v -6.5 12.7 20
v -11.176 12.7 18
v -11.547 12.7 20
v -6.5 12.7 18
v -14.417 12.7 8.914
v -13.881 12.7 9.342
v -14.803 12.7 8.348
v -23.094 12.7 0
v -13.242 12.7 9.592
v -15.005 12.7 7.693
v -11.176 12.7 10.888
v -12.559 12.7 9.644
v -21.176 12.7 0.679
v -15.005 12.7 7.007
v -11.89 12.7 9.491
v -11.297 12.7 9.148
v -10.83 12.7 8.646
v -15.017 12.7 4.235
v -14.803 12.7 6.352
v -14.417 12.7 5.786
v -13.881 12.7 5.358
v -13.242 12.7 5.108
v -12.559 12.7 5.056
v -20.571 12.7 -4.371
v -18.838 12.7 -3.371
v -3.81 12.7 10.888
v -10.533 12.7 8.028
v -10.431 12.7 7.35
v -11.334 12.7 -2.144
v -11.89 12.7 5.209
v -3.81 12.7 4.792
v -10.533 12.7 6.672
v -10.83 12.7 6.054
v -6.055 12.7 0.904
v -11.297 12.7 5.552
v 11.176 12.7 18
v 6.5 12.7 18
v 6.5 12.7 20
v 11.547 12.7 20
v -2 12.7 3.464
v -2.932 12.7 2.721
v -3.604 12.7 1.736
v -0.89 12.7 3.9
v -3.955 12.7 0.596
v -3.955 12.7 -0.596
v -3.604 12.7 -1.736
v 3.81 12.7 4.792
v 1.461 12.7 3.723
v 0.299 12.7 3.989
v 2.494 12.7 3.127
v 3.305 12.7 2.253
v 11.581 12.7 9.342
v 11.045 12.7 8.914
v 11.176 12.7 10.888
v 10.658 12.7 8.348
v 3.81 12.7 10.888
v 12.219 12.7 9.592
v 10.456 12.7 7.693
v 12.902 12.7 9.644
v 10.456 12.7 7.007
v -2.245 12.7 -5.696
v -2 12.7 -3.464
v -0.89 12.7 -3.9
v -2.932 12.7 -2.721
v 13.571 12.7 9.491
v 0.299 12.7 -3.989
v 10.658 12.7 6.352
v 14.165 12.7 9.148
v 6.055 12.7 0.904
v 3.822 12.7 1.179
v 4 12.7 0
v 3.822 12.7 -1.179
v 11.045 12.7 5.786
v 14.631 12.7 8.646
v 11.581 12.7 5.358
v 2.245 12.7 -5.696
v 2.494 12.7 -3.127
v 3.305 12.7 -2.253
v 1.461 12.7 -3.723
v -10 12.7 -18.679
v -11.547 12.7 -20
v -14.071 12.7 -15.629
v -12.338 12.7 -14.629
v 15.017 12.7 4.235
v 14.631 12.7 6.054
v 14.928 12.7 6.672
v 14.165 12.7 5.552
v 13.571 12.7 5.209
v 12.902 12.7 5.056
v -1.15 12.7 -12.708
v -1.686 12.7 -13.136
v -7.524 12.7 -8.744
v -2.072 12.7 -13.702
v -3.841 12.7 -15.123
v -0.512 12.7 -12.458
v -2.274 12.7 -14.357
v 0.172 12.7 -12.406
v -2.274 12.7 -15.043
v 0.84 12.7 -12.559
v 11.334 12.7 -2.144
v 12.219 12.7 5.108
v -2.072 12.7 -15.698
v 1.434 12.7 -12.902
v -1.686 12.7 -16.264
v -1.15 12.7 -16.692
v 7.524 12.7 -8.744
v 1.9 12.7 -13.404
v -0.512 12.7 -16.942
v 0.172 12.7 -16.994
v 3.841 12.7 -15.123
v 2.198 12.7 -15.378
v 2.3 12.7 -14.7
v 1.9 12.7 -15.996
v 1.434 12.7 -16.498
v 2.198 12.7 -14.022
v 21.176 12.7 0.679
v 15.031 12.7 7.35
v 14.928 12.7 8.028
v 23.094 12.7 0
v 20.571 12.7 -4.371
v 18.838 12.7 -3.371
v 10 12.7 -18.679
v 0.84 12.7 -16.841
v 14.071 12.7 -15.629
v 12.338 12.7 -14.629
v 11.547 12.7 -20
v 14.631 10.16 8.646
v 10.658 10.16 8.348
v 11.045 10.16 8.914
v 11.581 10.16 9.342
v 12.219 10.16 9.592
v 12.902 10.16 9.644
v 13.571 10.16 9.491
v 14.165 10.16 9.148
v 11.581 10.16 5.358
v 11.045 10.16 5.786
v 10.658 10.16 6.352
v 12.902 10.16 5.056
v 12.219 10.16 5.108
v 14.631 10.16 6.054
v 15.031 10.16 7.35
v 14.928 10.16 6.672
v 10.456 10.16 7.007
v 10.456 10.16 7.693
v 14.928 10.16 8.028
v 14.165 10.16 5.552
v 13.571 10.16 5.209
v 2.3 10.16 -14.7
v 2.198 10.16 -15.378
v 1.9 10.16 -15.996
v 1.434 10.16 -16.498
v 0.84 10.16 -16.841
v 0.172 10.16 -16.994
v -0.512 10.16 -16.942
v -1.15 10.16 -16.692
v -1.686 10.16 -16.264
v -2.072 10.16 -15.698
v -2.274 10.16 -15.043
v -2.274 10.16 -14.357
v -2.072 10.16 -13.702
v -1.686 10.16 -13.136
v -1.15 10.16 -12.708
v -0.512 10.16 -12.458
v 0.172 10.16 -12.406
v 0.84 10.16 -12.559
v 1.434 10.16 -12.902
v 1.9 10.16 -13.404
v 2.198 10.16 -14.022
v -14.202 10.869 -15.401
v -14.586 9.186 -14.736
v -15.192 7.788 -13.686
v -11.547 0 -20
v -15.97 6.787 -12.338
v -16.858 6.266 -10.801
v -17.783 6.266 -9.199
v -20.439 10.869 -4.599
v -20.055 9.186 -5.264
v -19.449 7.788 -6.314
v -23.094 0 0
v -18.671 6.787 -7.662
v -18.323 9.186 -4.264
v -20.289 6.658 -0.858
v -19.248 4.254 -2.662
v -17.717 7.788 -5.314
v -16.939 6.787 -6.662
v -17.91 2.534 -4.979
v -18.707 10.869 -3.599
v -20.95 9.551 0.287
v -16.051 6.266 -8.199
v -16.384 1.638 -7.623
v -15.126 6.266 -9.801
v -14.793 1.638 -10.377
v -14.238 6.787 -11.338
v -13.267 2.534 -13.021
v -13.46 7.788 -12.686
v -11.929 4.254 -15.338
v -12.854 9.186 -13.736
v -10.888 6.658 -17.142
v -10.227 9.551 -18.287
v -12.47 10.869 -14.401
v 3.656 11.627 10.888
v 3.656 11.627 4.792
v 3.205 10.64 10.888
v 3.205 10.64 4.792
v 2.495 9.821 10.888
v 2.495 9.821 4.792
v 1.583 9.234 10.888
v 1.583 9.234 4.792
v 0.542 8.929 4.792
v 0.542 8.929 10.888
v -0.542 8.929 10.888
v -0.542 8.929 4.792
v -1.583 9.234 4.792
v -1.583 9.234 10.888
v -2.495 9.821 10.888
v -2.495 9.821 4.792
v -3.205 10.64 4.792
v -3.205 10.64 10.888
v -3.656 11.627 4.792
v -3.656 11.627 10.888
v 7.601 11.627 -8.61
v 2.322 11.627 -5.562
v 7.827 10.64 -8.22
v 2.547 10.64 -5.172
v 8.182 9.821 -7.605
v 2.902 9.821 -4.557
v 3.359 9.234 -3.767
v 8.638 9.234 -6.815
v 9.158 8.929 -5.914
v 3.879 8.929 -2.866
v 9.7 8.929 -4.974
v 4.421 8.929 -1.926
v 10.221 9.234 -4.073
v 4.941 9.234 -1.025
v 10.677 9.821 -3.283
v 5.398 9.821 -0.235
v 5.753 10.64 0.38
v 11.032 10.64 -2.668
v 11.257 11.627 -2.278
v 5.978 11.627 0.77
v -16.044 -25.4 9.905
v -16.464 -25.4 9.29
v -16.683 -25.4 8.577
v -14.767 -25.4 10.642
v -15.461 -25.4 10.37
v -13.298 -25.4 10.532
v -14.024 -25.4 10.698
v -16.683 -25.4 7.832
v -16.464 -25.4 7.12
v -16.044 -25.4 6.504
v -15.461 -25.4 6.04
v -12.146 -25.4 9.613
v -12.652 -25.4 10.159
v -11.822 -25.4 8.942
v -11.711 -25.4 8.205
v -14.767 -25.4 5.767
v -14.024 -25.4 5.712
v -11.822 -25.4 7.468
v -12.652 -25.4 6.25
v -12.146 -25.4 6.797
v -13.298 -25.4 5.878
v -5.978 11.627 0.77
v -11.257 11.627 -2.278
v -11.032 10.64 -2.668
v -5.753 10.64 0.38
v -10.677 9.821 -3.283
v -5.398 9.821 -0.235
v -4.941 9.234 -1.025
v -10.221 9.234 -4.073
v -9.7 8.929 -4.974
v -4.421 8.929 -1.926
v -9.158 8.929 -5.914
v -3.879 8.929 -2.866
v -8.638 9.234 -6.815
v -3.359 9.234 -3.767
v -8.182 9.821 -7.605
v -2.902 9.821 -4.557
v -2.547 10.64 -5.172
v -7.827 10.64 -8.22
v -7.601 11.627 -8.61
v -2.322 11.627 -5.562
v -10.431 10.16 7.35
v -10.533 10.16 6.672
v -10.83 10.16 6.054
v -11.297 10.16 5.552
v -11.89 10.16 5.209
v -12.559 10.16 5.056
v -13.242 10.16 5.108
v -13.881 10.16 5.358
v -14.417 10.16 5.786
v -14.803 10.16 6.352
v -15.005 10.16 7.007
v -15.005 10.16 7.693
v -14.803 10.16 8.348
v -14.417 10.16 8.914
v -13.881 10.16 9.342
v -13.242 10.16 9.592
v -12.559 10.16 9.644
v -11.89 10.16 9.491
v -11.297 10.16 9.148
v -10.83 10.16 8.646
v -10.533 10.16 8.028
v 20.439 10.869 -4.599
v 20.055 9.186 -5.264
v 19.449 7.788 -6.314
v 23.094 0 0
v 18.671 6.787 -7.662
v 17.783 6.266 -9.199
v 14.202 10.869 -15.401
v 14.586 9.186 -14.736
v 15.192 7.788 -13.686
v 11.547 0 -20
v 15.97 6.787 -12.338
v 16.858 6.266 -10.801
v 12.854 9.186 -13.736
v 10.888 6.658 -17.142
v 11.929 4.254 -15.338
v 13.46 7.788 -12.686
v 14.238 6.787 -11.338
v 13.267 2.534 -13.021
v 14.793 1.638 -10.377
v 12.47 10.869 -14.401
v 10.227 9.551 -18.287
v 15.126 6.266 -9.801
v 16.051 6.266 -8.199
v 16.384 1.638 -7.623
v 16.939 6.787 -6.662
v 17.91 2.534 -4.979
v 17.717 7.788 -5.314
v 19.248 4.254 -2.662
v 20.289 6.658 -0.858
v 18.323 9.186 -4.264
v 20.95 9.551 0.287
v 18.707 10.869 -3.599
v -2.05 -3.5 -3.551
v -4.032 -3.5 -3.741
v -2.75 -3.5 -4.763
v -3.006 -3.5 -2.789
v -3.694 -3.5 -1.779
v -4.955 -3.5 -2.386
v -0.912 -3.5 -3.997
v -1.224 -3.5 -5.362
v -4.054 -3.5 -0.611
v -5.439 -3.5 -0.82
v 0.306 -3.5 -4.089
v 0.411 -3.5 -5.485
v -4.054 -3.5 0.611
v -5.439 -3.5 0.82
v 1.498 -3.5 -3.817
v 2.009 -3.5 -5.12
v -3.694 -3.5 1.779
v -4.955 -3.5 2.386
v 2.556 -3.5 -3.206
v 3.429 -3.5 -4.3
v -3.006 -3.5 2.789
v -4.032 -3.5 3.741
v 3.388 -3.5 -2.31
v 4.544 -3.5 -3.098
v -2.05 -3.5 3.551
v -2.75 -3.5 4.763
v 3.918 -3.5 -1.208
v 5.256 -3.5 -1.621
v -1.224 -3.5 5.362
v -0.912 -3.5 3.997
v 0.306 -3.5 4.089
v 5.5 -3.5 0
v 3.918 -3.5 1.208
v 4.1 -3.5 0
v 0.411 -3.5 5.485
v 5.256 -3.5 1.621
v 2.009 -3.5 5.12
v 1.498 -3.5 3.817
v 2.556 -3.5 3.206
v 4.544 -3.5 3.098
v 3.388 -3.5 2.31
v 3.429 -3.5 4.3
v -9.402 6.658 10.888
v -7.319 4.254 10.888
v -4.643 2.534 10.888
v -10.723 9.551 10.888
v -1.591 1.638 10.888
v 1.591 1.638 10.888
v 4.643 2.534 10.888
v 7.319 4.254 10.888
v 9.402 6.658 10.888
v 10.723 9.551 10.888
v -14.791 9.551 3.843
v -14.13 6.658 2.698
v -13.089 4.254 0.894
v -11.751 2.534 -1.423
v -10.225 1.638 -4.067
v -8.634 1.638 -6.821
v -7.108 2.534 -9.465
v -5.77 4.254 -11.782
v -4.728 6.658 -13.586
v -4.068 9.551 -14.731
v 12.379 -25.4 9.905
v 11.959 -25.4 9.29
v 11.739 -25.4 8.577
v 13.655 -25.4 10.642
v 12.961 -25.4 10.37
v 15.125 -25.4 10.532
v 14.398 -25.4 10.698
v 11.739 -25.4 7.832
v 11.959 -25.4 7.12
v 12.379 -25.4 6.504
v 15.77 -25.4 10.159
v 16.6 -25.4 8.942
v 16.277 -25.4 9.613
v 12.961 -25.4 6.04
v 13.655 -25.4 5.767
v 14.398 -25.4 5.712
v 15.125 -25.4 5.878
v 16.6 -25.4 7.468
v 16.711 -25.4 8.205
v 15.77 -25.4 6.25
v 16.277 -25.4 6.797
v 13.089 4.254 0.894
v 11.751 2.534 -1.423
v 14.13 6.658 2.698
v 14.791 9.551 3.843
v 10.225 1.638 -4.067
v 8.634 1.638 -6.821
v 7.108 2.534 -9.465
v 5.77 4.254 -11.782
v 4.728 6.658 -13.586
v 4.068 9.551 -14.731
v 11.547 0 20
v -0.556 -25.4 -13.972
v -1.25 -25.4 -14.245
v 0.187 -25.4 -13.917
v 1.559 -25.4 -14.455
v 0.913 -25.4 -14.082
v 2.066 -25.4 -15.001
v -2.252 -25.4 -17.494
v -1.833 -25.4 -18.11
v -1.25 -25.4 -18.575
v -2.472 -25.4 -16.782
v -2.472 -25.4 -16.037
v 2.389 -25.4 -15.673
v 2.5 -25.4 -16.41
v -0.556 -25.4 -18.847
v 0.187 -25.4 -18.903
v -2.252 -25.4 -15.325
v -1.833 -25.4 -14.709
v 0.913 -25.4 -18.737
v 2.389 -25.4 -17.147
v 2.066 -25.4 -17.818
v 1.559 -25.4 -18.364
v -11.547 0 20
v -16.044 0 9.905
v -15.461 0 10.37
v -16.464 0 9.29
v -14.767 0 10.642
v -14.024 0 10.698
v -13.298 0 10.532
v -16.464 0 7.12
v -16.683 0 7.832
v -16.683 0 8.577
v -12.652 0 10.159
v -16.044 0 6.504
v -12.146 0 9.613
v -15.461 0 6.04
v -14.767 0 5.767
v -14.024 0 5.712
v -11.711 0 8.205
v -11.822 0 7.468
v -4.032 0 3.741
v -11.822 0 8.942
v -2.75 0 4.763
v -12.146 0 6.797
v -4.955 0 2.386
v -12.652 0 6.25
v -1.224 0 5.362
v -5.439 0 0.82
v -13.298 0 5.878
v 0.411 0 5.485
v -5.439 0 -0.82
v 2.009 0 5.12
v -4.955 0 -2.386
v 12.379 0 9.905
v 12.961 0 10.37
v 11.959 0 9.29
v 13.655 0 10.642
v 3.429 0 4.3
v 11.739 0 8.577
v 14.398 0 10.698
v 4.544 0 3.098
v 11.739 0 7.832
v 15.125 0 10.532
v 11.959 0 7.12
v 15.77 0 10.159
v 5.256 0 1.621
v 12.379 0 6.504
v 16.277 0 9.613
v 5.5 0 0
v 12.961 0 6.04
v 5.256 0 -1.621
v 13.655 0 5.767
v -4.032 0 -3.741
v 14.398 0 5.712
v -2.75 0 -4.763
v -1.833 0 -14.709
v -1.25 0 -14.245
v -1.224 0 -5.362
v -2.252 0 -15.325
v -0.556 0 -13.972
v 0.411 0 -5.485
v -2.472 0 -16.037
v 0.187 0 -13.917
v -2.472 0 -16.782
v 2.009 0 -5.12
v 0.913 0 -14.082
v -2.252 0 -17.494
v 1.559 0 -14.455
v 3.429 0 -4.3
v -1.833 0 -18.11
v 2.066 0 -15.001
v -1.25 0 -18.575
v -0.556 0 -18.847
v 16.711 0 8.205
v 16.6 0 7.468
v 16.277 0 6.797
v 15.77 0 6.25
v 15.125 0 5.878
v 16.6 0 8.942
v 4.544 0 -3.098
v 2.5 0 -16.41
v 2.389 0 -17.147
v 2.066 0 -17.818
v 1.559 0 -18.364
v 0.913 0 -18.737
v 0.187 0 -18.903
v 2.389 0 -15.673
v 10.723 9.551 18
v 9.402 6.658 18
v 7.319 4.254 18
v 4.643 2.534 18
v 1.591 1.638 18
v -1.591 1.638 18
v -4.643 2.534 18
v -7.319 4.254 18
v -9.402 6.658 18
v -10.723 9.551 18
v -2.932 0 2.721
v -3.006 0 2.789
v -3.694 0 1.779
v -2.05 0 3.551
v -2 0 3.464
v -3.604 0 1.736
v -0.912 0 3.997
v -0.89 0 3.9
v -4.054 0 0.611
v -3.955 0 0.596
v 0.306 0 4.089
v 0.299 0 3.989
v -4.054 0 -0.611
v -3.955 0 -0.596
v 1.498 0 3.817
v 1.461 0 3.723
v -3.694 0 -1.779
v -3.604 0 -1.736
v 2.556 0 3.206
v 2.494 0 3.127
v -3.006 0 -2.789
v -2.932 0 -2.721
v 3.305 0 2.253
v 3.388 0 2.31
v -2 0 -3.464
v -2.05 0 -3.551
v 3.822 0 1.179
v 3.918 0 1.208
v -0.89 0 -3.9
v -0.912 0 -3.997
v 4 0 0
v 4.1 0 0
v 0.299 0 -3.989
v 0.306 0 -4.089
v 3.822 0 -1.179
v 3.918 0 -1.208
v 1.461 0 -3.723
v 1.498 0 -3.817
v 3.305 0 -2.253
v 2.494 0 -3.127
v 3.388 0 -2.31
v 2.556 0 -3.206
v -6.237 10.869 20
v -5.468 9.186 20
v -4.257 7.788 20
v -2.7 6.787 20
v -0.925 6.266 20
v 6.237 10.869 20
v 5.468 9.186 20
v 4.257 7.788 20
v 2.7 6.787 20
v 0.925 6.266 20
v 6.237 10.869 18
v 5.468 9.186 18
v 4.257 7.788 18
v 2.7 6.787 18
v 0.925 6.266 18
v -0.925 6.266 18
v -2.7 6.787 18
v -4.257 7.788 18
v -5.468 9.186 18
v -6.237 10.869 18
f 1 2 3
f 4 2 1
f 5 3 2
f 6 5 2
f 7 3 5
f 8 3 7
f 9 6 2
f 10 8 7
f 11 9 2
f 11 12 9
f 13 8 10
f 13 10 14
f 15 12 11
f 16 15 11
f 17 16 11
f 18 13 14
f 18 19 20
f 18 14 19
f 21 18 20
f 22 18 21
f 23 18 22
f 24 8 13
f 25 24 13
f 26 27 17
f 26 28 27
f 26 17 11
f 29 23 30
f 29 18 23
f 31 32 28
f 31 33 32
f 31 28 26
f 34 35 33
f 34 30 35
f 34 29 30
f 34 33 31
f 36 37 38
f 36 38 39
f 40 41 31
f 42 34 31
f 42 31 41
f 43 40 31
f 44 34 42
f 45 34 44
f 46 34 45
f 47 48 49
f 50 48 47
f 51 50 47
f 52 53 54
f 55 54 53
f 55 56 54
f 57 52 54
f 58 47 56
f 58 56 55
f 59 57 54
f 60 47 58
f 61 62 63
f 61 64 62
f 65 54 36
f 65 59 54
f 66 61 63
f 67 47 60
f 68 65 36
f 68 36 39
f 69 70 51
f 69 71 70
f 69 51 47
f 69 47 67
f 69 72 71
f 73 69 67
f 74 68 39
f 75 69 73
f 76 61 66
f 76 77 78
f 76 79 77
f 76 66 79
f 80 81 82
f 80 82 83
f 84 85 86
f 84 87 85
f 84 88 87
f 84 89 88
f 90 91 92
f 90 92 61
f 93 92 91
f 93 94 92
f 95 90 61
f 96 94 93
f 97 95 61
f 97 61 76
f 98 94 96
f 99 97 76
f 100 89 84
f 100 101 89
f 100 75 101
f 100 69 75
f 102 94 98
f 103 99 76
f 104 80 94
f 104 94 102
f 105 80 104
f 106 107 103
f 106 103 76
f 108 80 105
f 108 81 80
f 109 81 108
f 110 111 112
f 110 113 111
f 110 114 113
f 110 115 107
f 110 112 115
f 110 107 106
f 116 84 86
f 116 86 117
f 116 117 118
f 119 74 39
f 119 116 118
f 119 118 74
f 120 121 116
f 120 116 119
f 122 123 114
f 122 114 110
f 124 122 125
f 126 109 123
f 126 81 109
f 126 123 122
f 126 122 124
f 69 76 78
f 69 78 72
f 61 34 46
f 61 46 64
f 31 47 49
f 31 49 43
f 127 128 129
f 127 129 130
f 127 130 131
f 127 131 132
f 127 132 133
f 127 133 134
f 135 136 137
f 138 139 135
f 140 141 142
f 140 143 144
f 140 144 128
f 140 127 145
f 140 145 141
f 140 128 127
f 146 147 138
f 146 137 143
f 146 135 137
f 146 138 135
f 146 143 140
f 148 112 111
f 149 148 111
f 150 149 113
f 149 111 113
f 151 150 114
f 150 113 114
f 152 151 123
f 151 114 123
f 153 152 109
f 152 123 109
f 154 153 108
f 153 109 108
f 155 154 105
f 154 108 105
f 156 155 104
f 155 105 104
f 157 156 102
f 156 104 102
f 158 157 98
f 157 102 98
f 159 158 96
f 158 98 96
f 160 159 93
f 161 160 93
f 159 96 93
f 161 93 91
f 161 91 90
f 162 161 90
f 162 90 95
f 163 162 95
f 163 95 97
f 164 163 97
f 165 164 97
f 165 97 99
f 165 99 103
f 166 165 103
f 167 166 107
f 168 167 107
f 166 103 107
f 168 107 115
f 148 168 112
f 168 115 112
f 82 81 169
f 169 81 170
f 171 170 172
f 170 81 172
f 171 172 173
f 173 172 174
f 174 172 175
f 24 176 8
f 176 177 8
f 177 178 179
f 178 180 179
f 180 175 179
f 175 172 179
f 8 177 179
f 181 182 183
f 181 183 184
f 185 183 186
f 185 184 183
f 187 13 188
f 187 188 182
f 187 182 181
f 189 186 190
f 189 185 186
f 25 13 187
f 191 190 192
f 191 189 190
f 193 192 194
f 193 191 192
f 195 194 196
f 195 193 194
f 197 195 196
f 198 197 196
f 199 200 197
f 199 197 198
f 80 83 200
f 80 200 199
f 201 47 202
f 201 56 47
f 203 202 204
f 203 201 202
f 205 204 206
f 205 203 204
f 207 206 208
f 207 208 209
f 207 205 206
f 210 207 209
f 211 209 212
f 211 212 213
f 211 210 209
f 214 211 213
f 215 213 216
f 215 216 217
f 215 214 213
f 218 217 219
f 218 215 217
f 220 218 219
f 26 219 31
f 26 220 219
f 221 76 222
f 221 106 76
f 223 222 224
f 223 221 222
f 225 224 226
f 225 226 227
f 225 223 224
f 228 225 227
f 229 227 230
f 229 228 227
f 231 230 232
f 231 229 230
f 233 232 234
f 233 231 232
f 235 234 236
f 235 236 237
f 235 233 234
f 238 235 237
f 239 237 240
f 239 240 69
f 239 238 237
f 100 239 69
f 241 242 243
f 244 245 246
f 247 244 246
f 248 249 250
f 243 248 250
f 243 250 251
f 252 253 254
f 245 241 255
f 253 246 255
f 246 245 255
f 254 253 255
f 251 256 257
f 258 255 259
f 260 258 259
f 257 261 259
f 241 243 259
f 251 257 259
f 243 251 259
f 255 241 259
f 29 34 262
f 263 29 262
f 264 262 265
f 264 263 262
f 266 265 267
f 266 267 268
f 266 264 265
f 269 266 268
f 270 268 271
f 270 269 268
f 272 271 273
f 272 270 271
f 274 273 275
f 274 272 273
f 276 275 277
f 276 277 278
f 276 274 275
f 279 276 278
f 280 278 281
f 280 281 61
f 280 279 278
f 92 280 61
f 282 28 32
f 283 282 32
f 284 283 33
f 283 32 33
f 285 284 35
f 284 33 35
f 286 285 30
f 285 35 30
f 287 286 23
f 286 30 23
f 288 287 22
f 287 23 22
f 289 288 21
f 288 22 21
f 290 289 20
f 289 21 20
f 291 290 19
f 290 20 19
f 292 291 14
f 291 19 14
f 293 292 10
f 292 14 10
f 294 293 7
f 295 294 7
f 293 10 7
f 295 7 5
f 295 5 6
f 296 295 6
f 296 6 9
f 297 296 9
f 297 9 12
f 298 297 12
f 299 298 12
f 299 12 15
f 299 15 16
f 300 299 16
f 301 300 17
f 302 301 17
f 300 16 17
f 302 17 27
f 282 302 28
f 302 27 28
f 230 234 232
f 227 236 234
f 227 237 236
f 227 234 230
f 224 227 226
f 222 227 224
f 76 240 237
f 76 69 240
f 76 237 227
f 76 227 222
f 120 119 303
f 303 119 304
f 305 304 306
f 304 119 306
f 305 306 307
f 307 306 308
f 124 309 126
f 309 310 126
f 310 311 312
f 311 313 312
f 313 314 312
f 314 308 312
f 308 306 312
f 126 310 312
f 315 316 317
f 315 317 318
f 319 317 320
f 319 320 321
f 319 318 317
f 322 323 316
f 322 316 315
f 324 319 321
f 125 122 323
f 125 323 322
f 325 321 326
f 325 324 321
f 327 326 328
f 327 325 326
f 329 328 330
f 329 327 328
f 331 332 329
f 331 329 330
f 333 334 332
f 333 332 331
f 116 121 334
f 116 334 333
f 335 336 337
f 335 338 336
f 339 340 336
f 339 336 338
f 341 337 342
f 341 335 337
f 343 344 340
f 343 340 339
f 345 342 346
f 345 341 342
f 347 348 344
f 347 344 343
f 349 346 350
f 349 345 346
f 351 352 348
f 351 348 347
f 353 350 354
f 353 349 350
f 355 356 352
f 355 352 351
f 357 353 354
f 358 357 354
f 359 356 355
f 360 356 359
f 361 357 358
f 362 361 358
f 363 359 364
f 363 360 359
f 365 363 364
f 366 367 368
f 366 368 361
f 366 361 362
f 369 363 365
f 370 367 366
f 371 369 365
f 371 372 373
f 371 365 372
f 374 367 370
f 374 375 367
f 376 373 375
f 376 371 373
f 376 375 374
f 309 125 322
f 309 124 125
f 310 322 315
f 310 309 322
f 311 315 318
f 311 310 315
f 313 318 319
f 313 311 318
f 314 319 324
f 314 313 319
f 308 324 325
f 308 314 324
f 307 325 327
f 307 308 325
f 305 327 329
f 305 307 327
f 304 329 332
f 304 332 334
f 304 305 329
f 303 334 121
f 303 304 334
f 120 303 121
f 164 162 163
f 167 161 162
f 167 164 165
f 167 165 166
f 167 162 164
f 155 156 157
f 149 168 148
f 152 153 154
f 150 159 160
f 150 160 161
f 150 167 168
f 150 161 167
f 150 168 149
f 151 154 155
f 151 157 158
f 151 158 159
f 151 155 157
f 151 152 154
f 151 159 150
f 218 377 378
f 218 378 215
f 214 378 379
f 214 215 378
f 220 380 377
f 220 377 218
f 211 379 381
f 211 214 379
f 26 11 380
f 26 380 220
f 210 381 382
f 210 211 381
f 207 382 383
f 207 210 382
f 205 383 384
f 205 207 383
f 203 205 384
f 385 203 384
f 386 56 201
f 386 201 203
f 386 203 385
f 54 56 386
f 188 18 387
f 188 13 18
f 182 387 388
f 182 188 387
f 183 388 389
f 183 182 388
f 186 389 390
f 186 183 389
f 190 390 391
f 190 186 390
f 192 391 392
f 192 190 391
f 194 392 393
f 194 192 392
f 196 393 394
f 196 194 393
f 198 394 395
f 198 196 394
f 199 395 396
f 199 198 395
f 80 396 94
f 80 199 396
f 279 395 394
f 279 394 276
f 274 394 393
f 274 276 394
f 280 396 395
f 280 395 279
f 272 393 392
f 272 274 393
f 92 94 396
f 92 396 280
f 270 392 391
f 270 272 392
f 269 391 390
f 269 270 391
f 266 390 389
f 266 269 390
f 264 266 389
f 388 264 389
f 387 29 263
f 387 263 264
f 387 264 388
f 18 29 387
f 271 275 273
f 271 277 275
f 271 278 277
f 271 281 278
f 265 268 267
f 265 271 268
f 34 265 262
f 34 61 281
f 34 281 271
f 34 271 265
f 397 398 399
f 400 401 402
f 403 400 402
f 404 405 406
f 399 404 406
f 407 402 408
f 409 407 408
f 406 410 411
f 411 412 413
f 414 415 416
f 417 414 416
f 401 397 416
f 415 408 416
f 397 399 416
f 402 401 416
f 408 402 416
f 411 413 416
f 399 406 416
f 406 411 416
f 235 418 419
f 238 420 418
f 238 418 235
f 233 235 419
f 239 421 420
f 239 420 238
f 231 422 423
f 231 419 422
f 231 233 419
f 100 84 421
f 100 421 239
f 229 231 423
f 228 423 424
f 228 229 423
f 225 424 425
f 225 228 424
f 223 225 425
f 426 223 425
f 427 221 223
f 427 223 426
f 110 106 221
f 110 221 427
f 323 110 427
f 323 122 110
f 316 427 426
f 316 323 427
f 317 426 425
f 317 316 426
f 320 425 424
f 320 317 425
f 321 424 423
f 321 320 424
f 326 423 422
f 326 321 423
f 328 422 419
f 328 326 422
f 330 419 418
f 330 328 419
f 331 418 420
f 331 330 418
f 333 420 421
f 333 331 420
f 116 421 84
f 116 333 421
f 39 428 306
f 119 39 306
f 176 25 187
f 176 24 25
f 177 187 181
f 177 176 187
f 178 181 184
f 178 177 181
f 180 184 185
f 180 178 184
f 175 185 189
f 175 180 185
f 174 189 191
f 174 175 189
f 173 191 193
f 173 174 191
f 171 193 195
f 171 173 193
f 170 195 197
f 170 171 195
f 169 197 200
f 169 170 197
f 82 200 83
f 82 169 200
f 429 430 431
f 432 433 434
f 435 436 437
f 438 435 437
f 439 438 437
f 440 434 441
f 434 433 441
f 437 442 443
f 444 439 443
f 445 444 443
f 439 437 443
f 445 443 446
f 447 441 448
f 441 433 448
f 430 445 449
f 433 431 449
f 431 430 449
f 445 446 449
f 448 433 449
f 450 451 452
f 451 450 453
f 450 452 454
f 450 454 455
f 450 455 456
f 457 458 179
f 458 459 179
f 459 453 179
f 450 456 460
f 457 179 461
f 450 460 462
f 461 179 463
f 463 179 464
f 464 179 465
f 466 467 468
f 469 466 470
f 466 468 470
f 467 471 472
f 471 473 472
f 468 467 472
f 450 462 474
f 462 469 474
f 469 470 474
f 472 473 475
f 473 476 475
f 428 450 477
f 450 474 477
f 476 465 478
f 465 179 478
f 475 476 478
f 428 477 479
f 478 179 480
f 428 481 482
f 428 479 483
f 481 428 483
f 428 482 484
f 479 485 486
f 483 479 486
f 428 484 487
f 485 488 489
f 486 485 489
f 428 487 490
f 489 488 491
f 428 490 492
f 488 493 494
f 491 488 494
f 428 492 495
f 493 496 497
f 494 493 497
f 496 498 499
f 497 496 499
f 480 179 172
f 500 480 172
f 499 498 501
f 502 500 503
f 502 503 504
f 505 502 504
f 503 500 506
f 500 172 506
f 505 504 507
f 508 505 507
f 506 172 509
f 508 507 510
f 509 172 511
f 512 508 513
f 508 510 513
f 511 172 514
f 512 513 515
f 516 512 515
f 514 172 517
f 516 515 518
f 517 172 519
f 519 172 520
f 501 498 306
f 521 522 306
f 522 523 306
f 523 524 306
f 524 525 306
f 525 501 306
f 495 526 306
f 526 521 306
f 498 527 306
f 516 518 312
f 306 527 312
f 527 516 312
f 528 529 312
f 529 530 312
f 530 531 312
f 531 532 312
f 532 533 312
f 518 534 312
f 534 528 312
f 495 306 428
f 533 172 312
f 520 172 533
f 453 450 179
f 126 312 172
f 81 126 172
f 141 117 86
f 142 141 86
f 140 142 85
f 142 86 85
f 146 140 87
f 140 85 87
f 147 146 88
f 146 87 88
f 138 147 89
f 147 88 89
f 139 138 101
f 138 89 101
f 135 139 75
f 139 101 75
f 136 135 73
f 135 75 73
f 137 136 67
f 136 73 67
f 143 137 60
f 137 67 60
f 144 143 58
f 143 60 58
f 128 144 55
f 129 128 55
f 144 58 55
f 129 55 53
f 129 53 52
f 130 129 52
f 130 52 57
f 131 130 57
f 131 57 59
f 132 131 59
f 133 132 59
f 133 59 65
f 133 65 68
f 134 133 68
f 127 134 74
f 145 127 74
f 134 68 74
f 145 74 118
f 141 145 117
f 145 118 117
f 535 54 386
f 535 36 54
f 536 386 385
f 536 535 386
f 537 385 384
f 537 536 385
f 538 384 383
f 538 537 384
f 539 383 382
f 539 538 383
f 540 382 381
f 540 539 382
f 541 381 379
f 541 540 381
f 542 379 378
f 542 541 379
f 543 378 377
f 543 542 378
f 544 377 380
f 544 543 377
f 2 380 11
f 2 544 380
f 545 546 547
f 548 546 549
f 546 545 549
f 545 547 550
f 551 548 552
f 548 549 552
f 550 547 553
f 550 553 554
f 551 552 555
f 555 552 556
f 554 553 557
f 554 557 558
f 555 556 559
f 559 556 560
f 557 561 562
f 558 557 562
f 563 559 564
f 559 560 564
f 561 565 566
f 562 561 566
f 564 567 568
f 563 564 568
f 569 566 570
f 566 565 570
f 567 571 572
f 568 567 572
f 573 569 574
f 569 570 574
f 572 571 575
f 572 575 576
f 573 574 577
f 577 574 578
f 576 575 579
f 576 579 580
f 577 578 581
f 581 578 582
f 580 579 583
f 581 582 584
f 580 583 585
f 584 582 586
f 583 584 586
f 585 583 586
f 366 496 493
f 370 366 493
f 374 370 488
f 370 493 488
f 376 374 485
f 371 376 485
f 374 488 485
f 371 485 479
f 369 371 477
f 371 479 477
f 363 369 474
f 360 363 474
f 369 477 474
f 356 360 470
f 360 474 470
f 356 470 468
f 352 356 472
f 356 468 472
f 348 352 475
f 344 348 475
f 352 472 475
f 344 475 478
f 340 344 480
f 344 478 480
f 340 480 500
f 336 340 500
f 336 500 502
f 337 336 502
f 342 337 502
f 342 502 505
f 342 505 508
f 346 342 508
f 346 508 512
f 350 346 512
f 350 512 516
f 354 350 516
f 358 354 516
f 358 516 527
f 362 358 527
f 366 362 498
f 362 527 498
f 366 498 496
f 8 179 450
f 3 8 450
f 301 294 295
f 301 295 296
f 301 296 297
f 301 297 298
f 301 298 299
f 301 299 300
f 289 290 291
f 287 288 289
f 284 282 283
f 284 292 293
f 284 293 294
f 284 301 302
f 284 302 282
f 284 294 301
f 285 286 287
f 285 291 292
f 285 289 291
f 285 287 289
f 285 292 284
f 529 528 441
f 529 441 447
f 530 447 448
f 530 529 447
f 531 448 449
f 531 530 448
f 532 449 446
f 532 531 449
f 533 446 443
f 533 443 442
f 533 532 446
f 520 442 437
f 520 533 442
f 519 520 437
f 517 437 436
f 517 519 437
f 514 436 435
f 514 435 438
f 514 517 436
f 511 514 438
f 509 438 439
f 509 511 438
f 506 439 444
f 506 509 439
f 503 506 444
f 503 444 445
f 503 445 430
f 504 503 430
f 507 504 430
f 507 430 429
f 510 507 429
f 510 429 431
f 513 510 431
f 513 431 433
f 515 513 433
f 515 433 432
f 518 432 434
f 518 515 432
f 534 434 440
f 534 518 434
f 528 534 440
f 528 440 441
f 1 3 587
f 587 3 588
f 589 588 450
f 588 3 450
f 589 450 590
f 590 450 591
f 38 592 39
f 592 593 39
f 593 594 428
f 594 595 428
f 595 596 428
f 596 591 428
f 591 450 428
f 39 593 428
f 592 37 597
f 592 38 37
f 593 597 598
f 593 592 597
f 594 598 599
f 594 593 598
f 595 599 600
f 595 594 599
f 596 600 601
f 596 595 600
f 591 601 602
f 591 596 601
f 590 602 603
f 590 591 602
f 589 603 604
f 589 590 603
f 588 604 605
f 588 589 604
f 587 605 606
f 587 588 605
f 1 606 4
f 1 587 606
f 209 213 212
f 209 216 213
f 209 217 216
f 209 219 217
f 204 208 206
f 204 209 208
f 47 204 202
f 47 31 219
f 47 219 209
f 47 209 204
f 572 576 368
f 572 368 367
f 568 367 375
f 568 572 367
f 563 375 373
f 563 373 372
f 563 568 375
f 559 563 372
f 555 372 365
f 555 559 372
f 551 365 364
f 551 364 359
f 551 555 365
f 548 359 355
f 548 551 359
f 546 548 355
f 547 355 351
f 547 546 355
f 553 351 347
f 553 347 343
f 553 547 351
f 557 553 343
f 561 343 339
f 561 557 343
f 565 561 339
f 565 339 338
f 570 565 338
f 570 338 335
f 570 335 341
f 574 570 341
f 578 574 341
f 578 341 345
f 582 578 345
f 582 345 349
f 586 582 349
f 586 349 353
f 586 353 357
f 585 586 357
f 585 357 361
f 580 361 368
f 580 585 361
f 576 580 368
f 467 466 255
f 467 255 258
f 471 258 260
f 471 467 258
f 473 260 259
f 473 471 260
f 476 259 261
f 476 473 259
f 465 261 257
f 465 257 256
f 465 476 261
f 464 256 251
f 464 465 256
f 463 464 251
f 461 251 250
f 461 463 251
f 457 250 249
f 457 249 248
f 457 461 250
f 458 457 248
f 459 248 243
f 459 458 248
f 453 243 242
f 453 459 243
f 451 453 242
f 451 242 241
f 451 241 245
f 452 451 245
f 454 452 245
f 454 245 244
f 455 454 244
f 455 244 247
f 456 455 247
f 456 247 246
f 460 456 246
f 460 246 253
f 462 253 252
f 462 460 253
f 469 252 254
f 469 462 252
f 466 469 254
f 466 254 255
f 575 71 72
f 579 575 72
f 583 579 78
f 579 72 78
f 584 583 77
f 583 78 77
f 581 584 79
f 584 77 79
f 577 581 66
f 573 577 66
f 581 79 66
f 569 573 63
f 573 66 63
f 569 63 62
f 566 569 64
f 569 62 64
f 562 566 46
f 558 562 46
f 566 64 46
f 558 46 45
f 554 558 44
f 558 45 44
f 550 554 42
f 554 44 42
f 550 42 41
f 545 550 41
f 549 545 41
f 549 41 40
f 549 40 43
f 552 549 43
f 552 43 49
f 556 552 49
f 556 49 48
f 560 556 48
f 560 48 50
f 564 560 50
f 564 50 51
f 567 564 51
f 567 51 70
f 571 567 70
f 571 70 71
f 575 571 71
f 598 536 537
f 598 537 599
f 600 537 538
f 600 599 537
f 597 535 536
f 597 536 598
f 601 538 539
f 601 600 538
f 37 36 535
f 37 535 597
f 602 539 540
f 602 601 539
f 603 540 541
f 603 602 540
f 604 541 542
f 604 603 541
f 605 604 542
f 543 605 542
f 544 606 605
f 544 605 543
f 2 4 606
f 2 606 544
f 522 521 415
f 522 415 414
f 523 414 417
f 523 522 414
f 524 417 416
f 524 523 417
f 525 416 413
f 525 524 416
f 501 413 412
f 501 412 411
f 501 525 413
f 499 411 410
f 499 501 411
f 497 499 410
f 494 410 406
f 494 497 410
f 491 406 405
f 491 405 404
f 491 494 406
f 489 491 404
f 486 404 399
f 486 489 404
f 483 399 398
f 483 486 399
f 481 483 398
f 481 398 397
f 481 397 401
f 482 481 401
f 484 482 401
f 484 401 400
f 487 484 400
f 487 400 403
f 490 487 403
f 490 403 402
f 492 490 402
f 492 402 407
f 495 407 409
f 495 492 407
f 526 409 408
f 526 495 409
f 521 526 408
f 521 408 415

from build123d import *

# Parameters (mm, degrees)
BOSS_EXTRUDE1_DEPTH = 12.7
SKETCH2_R           = 5.5
SKETCH2_R_2         = 4.1
BOSS_EXTRUDE2_DEPTH = 3.499999906
CIRPATTERN1_COUNT   = 3
SKETCH6_R           = 4
CUT_EXTRUDE1_DEPTH  = 17.199999906
RANDOM_CIRCLES_R    = 2.3
CUT_EXTRUDE2_DEPTH  = 2.54
SKETCH8_R           = 2.5
BOSS_EXTRUDE3_DEPTH = 25.4


with BuildPart() as part:
    # Sketch1 → Boss-Extrude1 (new body)
    with BuildSketch(Plane(origin=(0, 0, 0), x_dir=(1, 0, 0), z_dir=(0, 1, 0))):
        Polygon((11.547005384, -20), (23.094010768, 0), (11.547005384, 20), (-11.547005384, 20), (-23.094010768, 0), (-11.547005384, -20), align=None)
    extrude(amount=BOSS_EXTRUDE1_DEPTH)

    # Sketch2 → Boss-Extrude2 (add)
    with BuildSketch(Plane.XZ):
        Circle(SKETCH2_R)
        Circle(SKETCH2_R_2, mode=Mode.SUBTRACT)
    extrude(amount=BOSS_EXTRUDE2_DEPTH)

    # Sketch5 → Cut-Revolve1 (revolve, cut)
    with BuildSketch(Plane(origin=(0, 12.7, 0), x_dir=(1, 0, 0), z_dir=(0, 1, 0))):
        Polygon((0, -20), (0, -4.792), (-3.81, -4.792), (-3.81, -10.888), (-11.176, -10.888), (-11.176, -18), (-6.5, -18), (-6.5, -20), align=None)
    cut_revolve1 = revolve(axis=Axis((0, 12.7, 20), (0, 0, -1)), mode=Mode.SUBTRACT)

    # CirPattern1: Cut-Revolve1 ×3 about axis
    cirpattern1_axis = Axis((0, 0, 0), (0, 1, 0))
    for i in range(1, CIRPATTERN1_COUNT):
        add(cut_revolve1.rotate(cirpattern1_axis, i * 360 / CIRPATTERN1_COUNT), mode=Mode.SUBTRACT)

    # Sketch6 → Cut-Extrude1 (cut, through all)
    with BuildSketch(Plane(origin=(0, 12.7, 0), x_dir=(1, 0, 0), z_dir=(0, 1, 0))):
        Circle(SKETCH6_R)
    extrude(amount=-CUT_EXTRUDE1_DEPTH, mode=Mode.SUBTRACT)

    # Random Circles → Cut-Extrude2 (cut)
    with BuildSketch(Plane(origin=(0, 12.7, 0), x_dir=(1, 0, 0), z_dir=(0, 1, 0))):
        with Locations((0, 14.7)):
            Circle(RANDOM_CIRCLES_R)
        with Locations((12.730569972, -7.350006)):
            Circle(RANDOM_CIRCLES_R)
        with Locations((-12.730580364, -7.35)):
            Circle(RANDOM_CIRCLES_R)
    extrude(amount=-CUT_EXTRUDE2_DEPTH, mode=Mode.SUBTRACT)

    # Sketch8 → Boss-Extrude3 (add)
    with BuildSketch(Plane(origin=(0, 0, 0), x_dir=(1, 0, 0), z_dir=(0, 1, 0))):
        with Locations((0, 16.40962)):
            Circle(SKETCH8_R)
        with Locations((14.211147786, -8.20481)):
            Circle(SKETCH8_R)
        with Locations((-14.211147786, -8.20481)):
            Circle(SKETCH8_R)
    extrude(amount=-BOSS_EXTRUDE3_DEPTH)


solid = part.part
